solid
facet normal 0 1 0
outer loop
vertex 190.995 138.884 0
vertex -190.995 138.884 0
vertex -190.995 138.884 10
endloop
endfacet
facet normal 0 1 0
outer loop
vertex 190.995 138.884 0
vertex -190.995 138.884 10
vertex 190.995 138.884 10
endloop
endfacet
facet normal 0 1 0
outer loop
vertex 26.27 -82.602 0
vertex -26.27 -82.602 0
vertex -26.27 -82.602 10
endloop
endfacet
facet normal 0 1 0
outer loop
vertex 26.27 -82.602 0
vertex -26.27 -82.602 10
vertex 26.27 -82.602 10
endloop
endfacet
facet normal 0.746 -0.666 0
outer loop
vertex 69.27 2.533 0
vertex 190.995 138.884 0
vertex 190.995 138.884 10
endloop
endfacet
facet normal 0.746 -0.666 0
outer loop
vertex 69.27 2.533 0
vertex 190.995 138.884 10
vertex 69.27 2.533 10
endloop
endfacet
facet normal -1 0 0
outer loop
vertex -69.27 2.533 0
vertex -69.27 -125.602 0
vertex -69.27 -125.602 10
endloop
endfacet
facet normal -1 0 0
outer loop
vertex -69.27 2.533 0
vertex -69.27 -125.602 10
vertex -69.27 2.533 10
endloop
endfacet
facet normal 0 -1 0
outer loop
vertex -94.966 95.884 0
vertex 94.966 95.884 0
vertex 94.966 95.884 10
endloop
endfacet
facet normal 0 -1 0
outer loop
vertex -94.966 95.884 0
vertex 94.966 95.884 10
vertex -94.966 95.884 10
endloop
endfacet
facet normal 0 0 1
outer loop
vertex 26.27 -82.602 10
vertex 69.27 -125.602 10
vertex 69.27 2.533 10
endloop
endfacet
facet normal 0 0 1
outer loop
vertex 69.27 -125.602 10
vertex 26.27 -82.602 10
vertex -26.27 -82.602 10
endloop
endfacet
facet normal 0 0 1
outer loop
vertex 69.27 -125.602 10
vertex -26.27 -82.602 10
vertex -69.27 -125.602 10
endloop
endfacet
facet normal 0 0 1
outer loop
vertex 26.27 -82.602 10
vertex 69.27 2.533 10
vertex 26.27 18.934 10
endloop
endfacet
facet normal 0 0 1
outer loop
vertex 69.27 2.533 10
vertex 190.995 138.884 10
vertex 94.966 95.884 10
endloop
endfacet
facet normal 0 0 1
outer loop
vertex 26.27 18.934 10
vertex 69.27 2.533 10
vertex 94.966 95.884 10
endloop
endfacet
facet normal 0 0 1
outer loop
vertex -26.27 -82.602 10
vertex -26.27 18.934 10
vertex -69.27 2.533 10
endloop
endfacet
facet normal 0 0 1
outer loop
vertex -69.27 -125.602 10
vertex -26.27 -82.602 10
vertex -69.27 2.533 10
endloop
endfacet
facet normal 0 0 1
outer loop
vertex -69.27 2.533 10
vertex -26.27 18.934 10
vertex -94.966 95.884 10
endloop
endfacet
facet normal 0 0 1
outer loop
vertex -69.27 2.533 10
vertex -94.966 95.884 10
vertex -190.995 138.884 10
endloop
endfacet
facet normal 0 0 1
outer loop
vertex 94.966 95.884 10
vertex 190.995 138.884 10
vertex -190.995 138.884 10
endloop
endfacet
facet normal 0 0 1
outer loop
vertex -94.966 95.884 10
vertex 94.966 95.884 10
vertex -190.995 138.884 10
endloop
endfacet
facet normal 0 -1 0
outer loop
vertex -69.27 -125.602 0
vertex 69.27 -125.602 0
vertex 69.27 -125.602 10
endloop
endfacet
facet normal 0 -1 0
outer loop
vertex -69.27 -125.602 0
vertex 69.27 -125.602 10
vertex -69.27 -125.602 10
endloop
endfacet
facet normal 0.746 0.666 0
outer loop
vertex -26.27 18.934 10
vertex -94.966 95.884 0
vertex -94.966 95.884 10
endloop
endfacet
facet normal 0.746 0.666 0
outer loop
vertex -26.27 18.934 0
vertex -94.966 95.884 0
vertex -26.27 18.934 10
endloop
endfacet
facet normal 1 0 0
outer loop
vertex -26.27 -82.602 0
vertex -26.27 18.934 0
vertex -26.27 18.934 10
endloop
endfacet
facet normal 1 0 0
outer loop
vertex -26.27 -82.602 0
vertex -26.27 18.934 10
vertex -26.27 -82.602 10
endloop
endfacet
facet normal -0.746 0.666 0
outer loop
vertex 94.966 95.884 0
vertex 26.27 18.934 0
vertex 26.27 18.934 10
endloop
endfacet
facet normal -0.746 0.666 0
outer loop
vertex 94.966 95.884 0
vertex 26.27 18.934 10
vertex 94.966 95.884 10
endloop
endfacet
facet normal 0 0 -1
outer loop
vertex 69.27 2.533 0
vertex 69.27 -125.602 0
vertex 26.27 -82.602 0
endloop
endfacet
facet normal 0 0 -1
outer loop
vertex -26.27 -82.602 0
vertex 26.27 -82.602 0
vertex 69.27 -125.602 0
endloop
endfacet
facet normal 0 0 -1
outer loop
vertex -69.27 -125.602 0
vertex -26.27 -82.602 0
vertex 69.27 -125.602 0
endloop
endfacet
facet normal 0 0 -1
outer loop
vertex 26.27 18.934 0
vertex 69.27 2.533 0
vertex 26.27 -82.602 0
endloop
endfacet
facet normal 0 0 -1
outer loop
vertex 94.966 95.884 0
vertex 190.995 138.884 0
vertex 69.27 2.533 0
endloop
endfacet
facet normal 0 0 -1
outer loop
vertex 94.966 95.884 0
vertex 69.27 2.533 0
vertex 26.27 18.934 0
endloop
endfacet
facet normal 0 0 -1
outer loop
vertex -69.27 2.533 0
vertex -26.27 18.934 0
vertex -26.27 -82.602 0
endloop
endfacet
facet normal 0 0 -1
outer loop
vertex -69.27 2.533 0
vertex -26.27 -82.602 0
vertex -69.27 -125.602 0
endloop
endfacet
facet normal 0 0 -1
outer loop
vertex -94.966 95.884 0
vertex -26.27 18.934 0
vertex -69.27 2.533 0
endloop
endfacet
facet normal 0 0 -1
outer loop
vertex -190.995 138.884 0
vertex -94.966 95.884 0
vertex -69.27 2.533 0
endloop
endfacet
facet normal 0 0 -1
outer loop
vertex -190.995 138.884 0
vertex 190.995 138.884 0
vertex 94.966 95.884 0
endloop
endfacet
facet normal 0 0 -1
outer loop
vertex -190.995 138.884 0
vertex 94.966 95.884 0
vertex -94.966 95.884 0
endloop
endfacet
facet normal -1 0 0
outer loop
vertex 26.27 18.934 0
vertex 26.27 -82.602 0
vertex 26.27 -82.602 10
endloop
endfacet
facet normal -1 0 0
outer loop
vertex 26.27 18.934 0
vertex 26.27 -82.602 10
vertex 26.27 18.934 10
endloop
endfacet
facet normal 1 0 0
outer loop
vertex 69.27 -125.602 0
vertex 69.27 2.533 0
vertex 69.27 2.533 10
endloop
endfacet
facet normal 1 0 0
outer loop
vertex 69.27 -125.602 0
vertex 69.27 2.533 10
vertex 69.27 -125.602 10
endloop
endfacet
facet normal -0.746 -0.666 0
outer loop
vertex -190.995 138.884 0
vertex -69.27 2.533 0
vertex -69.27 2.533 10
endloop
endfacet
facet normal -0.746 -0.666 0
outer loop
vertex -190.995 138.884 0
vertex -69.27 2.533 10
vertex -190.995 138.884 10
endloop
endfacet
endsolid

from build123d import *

# Parameters (mm, degrees)
EXTRUDE_2_DEPTH = 10


with BuildPart() as part:
    # Эскиз5 → Бобышка-Вытянуть2 (new body)
    with BuildSketch(Plane.XY):
        Polygon((69.270264014, 2.532805315), (69.270264014, -125.60178411), (-69.270264014, -125.60178411), (-69.270264014, 2.532805315), (-190.995381487, 138.884340659), (190.995381487, 138.884340659), align=None)
        Polygon((-26.270264014, -82.60178411), (26.270264014, -82.60178411), (26.270264014, 18.934099876), (94.96605886, 95.884340659), (-94.96605886, 95.884340659), (-26.270264014, 18.934099876), align=None, mode=Mode.SUBTRACT)
    extrude(amount=EXTRUDE_2_DEPTH)


solid = part.part
